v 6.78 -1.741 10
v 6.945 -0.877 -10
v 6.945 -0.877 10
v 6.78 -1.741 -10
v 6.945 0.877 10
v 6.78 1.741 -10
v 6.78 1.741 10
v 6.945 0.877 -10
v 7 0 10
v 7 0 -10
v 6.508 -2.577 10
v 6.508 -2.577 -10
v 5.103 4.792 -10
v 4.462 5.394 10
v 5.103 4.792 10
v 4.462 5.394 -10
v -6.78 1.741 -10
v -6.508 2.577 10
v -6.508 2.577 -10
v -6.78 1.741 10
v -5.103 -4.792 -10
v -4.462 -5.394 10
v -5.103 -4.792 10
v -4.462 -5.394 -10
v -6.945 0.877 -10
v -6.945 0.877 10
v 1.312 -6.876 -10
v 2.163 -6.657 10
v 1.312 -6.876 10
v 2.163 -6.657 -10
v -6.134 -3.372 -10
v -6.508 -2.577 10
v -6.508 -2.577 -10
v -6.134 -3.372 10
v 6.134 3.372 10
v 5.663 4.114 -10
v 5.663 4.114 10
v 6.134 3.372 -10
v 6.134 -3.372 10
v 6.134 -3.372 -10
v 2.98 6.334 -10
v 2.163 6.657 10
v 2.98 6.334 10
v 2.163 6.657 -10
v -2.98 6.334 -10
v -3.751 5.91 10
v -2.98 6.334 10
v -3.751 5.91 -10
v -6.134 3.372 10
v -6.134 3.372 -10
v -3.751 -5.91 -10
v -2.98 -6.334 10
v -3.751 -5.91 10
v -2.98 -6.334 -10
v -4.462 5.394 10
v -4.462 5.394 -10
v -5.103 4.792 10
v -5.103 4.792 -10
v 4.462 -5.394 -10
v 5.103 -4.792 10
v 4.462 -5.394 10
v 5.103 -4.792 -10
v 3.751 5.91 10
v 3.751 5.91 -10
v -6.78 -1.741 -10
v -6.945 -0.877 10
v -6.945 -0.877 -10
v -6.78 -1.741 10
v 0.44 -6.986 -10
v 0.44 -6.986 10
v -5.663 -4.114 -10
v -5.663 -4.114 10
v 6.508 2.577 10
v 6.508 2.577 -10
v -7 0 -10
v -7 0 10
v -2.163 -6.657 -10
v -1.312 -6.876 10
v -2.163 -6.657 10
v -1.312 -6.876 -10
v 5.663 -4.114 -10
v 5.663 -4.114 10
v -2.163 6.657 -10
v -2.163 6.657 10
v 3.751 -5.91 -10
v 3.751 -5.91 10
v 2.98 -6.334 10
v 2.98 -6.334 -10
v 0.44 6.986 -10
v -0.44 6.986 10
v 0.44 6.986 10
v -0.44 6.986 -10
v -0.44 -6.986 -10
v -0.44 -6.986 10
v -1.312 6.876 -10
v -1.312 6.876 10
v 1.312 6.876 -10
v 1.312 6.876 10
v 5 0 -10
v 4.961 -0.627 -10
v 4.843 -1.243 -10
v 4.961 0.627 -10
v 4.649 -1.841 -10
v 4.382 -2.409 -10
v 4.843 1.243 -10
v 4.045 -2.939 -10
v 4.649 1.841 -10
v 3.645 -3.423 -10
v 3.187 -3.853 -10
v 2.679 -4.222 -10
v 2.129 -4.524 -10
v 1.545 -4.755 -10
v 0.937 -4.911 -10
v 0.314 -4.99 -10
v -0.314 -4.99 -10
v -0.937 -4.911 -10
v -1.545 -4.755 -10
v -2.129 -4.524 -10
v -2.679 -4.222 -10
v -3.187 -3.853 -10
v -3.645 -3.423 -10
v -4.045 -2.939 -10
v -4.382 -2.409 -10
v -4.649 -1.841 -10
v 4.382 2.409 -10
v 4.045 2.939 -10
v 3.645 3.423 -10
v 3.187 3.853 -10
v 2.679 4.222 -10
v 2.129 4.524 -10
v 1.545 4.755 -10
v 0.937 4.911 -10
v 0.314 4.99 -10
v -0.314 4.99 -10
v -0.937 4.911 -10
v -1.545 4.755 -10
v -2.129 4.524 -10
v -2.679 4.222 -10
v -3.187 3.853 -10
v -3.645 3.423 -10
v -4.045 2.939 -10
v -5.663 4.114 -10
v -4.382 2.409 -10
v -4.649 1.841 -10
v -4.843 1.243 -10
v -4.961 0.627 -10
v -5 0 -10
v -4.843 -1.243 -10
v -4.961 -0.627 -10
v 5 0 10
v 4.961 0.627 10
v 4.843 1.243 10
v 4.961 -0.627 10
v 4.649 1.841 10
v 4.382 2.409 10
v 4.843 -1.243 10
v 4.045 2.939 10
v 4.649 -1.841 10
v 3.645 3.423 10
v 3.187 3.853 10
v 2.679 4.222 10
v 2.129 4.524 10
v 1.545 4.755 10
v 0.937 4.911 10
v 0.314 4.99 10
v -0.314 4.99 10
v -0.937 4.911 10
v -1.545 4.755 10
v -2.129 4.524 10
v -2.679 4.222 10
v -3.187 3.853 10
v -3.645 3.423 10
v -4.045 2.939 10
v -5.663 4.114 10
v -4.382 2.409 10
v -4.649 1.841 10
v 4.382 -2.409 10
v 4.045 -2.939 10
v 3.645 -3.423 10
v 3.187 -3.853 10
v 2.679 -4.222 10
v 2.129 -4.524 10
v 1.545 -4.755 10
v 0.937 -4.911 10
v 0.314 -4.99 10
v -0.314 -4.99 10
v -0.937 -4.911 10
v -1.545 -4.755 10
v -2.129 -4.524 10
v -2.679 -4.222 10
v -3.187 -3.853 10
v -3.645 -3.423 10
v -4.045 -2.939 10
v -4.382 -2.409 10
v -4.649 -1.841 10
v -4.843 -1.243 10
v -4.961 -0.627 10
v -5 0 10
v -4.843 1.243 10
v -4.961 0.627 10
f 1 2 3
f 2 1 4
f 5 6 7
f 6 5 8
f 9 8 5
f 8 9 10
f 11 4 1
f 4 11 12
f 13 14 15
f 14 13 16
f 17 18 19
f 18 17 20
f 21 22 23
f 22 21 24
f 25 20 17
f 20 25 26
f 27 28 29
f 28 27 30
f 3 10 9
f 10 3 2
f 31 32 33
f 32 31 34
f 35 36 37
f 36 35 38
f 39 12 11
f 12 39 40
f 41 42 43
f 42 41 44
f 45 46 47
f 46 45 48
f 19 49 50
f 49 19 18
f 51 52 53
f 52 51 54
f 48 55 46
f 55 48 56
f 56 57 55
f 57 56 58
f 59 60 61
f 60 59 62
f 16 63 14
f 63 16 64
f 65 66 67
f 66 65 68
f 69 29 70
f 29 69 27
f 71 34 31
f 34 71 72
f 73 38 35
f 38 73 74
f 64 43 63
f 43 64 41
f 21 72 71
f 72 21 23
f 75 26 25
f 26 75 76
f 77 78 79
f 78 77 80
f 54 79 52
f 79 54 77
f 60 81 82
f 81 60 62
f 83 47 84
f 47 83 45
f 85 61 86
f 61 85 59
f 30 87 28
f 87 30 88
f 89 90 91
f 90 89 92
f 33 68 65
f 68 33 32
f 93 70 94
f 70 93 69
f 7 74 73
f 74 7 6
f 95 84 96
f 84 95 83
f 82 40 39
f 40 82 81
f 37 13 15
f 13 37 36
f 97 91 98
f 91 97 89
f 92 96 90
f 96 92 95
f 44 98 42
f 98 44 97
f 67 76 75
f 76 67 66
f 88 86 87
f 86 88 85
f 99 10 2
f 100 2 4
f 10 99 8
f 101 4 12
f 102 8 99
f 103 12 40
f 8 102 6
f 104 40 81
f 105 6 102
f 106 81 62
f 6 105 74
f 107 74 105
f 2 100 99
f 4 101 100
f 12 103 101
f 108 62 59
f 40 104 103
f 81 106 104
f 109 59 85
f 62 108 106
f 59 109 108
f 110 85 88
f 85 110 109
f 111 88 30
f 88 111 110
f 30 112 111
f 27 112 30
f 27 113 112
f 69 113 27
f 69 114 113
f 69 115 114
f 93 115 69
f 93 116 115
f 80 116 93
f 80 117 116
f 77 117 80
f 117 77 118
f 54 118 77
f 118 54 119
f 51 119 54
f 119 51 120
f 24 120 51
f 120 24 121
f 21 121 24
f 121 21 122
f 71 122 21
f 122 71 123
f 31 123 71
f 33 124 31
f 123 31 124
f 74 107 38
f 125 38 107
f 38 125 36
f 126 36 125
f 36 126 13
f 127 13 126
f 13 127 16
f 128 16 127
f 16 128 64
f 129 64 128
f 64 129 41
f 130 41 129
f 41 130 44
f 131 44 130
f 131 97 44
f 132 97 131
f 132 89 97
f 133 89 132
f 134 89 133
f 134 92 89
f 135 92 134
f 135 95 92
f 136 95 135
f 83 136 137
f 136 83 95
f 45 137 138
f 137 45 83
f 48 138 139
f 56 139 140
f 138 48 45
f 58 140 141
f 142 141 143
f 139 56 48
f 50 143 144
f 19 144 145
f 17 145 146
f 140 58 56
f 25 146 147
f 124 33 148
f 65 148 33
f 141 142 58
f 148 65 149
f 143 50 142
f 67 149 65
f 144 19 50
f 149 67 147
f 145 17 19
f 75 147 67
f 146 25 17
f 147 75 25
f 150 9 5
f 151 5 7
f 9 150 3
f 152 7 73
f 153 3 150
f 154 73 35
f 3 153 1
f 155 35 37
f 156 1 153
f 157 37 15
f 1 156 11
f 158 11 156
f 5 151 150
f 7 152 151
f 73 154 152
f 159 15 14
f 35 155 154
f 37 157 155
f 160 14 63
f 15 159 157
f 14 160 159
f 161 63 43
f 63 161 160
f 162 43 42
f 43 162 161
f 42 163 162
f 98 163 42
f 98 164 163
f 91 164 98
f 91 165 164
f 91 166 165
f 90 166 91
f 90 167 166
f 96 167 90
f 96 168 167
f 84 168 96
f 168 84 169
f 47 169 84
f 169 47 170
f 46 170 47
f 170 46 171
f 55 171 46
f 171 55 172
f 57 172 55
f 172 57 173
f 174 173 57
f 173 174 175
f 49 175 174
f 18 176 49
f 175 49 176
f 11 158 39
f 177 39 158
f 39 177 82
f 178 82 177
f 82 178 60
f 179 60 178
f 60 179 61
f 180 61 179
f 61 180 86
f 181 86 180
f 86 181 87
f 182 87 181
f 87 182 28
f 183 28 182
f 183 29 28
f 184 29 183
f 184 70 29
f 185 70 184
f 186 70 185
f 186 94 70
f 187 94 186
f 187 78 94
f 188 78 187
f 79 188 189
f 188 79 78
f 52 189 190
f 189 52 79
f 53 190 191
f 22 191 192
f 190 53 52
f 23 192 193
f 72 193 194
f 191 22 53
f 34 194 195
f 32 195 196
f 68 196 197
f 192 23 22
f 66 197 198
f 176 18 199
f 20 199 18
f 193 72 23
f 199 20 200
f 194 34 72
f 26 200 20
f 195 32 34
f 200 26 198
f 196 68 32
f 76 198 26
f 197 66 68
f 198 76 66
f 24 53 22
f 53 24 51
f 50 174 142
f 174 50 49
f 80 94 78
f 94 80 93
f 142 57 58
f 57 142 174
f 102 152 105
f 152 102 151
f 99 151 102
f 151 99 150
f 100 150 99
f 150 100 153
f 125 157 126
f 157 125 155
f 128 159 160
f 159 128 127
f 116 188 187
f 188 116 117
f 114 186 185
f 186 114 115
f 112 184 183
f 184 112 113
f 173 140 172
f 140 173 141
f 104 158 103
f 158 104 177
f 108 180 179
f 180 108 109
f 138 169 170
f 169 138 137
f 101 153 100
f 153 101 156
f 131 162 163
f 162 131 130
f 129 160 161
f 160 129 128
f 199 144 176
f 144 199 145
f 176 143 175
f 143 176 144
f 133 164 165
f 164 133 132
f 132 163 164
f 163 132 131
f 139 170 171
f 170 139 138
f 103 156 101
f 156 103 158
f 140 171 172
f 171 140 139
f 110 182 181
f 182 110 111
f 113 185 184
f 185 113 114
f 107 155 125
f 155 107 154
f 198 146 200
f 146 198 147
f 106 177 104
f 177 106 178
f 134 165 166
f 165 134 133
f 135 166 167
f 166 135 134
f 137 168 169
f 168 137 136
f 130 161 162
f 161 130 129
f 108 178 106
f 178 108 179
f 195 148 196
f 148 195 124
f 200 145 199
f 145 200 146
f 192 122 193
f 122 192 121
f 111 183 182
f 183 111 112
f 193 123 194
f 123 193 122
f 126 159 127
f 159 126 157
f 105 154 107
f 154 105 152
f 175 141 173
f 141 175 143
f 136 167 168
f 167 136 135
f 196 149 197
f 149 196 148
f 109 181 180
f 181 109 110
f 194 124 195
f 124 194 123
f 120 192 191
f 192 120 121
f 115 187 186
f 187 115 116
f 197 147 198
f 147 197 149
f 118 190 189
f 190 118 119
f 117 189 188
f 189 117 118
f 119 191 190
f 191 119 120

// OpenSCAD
$fn = 50;


difference() {
	union() {
		translate(v = [0, 0, -10.0000000000]) {
			cylinder(h = 20, r = 7.0000000000);
		}
	}
	union() {
		translate(v = [0, 0, -100.0000000000]) {
			cylinder(h = 200, r = 5.0000000000);
		}
	}
}
